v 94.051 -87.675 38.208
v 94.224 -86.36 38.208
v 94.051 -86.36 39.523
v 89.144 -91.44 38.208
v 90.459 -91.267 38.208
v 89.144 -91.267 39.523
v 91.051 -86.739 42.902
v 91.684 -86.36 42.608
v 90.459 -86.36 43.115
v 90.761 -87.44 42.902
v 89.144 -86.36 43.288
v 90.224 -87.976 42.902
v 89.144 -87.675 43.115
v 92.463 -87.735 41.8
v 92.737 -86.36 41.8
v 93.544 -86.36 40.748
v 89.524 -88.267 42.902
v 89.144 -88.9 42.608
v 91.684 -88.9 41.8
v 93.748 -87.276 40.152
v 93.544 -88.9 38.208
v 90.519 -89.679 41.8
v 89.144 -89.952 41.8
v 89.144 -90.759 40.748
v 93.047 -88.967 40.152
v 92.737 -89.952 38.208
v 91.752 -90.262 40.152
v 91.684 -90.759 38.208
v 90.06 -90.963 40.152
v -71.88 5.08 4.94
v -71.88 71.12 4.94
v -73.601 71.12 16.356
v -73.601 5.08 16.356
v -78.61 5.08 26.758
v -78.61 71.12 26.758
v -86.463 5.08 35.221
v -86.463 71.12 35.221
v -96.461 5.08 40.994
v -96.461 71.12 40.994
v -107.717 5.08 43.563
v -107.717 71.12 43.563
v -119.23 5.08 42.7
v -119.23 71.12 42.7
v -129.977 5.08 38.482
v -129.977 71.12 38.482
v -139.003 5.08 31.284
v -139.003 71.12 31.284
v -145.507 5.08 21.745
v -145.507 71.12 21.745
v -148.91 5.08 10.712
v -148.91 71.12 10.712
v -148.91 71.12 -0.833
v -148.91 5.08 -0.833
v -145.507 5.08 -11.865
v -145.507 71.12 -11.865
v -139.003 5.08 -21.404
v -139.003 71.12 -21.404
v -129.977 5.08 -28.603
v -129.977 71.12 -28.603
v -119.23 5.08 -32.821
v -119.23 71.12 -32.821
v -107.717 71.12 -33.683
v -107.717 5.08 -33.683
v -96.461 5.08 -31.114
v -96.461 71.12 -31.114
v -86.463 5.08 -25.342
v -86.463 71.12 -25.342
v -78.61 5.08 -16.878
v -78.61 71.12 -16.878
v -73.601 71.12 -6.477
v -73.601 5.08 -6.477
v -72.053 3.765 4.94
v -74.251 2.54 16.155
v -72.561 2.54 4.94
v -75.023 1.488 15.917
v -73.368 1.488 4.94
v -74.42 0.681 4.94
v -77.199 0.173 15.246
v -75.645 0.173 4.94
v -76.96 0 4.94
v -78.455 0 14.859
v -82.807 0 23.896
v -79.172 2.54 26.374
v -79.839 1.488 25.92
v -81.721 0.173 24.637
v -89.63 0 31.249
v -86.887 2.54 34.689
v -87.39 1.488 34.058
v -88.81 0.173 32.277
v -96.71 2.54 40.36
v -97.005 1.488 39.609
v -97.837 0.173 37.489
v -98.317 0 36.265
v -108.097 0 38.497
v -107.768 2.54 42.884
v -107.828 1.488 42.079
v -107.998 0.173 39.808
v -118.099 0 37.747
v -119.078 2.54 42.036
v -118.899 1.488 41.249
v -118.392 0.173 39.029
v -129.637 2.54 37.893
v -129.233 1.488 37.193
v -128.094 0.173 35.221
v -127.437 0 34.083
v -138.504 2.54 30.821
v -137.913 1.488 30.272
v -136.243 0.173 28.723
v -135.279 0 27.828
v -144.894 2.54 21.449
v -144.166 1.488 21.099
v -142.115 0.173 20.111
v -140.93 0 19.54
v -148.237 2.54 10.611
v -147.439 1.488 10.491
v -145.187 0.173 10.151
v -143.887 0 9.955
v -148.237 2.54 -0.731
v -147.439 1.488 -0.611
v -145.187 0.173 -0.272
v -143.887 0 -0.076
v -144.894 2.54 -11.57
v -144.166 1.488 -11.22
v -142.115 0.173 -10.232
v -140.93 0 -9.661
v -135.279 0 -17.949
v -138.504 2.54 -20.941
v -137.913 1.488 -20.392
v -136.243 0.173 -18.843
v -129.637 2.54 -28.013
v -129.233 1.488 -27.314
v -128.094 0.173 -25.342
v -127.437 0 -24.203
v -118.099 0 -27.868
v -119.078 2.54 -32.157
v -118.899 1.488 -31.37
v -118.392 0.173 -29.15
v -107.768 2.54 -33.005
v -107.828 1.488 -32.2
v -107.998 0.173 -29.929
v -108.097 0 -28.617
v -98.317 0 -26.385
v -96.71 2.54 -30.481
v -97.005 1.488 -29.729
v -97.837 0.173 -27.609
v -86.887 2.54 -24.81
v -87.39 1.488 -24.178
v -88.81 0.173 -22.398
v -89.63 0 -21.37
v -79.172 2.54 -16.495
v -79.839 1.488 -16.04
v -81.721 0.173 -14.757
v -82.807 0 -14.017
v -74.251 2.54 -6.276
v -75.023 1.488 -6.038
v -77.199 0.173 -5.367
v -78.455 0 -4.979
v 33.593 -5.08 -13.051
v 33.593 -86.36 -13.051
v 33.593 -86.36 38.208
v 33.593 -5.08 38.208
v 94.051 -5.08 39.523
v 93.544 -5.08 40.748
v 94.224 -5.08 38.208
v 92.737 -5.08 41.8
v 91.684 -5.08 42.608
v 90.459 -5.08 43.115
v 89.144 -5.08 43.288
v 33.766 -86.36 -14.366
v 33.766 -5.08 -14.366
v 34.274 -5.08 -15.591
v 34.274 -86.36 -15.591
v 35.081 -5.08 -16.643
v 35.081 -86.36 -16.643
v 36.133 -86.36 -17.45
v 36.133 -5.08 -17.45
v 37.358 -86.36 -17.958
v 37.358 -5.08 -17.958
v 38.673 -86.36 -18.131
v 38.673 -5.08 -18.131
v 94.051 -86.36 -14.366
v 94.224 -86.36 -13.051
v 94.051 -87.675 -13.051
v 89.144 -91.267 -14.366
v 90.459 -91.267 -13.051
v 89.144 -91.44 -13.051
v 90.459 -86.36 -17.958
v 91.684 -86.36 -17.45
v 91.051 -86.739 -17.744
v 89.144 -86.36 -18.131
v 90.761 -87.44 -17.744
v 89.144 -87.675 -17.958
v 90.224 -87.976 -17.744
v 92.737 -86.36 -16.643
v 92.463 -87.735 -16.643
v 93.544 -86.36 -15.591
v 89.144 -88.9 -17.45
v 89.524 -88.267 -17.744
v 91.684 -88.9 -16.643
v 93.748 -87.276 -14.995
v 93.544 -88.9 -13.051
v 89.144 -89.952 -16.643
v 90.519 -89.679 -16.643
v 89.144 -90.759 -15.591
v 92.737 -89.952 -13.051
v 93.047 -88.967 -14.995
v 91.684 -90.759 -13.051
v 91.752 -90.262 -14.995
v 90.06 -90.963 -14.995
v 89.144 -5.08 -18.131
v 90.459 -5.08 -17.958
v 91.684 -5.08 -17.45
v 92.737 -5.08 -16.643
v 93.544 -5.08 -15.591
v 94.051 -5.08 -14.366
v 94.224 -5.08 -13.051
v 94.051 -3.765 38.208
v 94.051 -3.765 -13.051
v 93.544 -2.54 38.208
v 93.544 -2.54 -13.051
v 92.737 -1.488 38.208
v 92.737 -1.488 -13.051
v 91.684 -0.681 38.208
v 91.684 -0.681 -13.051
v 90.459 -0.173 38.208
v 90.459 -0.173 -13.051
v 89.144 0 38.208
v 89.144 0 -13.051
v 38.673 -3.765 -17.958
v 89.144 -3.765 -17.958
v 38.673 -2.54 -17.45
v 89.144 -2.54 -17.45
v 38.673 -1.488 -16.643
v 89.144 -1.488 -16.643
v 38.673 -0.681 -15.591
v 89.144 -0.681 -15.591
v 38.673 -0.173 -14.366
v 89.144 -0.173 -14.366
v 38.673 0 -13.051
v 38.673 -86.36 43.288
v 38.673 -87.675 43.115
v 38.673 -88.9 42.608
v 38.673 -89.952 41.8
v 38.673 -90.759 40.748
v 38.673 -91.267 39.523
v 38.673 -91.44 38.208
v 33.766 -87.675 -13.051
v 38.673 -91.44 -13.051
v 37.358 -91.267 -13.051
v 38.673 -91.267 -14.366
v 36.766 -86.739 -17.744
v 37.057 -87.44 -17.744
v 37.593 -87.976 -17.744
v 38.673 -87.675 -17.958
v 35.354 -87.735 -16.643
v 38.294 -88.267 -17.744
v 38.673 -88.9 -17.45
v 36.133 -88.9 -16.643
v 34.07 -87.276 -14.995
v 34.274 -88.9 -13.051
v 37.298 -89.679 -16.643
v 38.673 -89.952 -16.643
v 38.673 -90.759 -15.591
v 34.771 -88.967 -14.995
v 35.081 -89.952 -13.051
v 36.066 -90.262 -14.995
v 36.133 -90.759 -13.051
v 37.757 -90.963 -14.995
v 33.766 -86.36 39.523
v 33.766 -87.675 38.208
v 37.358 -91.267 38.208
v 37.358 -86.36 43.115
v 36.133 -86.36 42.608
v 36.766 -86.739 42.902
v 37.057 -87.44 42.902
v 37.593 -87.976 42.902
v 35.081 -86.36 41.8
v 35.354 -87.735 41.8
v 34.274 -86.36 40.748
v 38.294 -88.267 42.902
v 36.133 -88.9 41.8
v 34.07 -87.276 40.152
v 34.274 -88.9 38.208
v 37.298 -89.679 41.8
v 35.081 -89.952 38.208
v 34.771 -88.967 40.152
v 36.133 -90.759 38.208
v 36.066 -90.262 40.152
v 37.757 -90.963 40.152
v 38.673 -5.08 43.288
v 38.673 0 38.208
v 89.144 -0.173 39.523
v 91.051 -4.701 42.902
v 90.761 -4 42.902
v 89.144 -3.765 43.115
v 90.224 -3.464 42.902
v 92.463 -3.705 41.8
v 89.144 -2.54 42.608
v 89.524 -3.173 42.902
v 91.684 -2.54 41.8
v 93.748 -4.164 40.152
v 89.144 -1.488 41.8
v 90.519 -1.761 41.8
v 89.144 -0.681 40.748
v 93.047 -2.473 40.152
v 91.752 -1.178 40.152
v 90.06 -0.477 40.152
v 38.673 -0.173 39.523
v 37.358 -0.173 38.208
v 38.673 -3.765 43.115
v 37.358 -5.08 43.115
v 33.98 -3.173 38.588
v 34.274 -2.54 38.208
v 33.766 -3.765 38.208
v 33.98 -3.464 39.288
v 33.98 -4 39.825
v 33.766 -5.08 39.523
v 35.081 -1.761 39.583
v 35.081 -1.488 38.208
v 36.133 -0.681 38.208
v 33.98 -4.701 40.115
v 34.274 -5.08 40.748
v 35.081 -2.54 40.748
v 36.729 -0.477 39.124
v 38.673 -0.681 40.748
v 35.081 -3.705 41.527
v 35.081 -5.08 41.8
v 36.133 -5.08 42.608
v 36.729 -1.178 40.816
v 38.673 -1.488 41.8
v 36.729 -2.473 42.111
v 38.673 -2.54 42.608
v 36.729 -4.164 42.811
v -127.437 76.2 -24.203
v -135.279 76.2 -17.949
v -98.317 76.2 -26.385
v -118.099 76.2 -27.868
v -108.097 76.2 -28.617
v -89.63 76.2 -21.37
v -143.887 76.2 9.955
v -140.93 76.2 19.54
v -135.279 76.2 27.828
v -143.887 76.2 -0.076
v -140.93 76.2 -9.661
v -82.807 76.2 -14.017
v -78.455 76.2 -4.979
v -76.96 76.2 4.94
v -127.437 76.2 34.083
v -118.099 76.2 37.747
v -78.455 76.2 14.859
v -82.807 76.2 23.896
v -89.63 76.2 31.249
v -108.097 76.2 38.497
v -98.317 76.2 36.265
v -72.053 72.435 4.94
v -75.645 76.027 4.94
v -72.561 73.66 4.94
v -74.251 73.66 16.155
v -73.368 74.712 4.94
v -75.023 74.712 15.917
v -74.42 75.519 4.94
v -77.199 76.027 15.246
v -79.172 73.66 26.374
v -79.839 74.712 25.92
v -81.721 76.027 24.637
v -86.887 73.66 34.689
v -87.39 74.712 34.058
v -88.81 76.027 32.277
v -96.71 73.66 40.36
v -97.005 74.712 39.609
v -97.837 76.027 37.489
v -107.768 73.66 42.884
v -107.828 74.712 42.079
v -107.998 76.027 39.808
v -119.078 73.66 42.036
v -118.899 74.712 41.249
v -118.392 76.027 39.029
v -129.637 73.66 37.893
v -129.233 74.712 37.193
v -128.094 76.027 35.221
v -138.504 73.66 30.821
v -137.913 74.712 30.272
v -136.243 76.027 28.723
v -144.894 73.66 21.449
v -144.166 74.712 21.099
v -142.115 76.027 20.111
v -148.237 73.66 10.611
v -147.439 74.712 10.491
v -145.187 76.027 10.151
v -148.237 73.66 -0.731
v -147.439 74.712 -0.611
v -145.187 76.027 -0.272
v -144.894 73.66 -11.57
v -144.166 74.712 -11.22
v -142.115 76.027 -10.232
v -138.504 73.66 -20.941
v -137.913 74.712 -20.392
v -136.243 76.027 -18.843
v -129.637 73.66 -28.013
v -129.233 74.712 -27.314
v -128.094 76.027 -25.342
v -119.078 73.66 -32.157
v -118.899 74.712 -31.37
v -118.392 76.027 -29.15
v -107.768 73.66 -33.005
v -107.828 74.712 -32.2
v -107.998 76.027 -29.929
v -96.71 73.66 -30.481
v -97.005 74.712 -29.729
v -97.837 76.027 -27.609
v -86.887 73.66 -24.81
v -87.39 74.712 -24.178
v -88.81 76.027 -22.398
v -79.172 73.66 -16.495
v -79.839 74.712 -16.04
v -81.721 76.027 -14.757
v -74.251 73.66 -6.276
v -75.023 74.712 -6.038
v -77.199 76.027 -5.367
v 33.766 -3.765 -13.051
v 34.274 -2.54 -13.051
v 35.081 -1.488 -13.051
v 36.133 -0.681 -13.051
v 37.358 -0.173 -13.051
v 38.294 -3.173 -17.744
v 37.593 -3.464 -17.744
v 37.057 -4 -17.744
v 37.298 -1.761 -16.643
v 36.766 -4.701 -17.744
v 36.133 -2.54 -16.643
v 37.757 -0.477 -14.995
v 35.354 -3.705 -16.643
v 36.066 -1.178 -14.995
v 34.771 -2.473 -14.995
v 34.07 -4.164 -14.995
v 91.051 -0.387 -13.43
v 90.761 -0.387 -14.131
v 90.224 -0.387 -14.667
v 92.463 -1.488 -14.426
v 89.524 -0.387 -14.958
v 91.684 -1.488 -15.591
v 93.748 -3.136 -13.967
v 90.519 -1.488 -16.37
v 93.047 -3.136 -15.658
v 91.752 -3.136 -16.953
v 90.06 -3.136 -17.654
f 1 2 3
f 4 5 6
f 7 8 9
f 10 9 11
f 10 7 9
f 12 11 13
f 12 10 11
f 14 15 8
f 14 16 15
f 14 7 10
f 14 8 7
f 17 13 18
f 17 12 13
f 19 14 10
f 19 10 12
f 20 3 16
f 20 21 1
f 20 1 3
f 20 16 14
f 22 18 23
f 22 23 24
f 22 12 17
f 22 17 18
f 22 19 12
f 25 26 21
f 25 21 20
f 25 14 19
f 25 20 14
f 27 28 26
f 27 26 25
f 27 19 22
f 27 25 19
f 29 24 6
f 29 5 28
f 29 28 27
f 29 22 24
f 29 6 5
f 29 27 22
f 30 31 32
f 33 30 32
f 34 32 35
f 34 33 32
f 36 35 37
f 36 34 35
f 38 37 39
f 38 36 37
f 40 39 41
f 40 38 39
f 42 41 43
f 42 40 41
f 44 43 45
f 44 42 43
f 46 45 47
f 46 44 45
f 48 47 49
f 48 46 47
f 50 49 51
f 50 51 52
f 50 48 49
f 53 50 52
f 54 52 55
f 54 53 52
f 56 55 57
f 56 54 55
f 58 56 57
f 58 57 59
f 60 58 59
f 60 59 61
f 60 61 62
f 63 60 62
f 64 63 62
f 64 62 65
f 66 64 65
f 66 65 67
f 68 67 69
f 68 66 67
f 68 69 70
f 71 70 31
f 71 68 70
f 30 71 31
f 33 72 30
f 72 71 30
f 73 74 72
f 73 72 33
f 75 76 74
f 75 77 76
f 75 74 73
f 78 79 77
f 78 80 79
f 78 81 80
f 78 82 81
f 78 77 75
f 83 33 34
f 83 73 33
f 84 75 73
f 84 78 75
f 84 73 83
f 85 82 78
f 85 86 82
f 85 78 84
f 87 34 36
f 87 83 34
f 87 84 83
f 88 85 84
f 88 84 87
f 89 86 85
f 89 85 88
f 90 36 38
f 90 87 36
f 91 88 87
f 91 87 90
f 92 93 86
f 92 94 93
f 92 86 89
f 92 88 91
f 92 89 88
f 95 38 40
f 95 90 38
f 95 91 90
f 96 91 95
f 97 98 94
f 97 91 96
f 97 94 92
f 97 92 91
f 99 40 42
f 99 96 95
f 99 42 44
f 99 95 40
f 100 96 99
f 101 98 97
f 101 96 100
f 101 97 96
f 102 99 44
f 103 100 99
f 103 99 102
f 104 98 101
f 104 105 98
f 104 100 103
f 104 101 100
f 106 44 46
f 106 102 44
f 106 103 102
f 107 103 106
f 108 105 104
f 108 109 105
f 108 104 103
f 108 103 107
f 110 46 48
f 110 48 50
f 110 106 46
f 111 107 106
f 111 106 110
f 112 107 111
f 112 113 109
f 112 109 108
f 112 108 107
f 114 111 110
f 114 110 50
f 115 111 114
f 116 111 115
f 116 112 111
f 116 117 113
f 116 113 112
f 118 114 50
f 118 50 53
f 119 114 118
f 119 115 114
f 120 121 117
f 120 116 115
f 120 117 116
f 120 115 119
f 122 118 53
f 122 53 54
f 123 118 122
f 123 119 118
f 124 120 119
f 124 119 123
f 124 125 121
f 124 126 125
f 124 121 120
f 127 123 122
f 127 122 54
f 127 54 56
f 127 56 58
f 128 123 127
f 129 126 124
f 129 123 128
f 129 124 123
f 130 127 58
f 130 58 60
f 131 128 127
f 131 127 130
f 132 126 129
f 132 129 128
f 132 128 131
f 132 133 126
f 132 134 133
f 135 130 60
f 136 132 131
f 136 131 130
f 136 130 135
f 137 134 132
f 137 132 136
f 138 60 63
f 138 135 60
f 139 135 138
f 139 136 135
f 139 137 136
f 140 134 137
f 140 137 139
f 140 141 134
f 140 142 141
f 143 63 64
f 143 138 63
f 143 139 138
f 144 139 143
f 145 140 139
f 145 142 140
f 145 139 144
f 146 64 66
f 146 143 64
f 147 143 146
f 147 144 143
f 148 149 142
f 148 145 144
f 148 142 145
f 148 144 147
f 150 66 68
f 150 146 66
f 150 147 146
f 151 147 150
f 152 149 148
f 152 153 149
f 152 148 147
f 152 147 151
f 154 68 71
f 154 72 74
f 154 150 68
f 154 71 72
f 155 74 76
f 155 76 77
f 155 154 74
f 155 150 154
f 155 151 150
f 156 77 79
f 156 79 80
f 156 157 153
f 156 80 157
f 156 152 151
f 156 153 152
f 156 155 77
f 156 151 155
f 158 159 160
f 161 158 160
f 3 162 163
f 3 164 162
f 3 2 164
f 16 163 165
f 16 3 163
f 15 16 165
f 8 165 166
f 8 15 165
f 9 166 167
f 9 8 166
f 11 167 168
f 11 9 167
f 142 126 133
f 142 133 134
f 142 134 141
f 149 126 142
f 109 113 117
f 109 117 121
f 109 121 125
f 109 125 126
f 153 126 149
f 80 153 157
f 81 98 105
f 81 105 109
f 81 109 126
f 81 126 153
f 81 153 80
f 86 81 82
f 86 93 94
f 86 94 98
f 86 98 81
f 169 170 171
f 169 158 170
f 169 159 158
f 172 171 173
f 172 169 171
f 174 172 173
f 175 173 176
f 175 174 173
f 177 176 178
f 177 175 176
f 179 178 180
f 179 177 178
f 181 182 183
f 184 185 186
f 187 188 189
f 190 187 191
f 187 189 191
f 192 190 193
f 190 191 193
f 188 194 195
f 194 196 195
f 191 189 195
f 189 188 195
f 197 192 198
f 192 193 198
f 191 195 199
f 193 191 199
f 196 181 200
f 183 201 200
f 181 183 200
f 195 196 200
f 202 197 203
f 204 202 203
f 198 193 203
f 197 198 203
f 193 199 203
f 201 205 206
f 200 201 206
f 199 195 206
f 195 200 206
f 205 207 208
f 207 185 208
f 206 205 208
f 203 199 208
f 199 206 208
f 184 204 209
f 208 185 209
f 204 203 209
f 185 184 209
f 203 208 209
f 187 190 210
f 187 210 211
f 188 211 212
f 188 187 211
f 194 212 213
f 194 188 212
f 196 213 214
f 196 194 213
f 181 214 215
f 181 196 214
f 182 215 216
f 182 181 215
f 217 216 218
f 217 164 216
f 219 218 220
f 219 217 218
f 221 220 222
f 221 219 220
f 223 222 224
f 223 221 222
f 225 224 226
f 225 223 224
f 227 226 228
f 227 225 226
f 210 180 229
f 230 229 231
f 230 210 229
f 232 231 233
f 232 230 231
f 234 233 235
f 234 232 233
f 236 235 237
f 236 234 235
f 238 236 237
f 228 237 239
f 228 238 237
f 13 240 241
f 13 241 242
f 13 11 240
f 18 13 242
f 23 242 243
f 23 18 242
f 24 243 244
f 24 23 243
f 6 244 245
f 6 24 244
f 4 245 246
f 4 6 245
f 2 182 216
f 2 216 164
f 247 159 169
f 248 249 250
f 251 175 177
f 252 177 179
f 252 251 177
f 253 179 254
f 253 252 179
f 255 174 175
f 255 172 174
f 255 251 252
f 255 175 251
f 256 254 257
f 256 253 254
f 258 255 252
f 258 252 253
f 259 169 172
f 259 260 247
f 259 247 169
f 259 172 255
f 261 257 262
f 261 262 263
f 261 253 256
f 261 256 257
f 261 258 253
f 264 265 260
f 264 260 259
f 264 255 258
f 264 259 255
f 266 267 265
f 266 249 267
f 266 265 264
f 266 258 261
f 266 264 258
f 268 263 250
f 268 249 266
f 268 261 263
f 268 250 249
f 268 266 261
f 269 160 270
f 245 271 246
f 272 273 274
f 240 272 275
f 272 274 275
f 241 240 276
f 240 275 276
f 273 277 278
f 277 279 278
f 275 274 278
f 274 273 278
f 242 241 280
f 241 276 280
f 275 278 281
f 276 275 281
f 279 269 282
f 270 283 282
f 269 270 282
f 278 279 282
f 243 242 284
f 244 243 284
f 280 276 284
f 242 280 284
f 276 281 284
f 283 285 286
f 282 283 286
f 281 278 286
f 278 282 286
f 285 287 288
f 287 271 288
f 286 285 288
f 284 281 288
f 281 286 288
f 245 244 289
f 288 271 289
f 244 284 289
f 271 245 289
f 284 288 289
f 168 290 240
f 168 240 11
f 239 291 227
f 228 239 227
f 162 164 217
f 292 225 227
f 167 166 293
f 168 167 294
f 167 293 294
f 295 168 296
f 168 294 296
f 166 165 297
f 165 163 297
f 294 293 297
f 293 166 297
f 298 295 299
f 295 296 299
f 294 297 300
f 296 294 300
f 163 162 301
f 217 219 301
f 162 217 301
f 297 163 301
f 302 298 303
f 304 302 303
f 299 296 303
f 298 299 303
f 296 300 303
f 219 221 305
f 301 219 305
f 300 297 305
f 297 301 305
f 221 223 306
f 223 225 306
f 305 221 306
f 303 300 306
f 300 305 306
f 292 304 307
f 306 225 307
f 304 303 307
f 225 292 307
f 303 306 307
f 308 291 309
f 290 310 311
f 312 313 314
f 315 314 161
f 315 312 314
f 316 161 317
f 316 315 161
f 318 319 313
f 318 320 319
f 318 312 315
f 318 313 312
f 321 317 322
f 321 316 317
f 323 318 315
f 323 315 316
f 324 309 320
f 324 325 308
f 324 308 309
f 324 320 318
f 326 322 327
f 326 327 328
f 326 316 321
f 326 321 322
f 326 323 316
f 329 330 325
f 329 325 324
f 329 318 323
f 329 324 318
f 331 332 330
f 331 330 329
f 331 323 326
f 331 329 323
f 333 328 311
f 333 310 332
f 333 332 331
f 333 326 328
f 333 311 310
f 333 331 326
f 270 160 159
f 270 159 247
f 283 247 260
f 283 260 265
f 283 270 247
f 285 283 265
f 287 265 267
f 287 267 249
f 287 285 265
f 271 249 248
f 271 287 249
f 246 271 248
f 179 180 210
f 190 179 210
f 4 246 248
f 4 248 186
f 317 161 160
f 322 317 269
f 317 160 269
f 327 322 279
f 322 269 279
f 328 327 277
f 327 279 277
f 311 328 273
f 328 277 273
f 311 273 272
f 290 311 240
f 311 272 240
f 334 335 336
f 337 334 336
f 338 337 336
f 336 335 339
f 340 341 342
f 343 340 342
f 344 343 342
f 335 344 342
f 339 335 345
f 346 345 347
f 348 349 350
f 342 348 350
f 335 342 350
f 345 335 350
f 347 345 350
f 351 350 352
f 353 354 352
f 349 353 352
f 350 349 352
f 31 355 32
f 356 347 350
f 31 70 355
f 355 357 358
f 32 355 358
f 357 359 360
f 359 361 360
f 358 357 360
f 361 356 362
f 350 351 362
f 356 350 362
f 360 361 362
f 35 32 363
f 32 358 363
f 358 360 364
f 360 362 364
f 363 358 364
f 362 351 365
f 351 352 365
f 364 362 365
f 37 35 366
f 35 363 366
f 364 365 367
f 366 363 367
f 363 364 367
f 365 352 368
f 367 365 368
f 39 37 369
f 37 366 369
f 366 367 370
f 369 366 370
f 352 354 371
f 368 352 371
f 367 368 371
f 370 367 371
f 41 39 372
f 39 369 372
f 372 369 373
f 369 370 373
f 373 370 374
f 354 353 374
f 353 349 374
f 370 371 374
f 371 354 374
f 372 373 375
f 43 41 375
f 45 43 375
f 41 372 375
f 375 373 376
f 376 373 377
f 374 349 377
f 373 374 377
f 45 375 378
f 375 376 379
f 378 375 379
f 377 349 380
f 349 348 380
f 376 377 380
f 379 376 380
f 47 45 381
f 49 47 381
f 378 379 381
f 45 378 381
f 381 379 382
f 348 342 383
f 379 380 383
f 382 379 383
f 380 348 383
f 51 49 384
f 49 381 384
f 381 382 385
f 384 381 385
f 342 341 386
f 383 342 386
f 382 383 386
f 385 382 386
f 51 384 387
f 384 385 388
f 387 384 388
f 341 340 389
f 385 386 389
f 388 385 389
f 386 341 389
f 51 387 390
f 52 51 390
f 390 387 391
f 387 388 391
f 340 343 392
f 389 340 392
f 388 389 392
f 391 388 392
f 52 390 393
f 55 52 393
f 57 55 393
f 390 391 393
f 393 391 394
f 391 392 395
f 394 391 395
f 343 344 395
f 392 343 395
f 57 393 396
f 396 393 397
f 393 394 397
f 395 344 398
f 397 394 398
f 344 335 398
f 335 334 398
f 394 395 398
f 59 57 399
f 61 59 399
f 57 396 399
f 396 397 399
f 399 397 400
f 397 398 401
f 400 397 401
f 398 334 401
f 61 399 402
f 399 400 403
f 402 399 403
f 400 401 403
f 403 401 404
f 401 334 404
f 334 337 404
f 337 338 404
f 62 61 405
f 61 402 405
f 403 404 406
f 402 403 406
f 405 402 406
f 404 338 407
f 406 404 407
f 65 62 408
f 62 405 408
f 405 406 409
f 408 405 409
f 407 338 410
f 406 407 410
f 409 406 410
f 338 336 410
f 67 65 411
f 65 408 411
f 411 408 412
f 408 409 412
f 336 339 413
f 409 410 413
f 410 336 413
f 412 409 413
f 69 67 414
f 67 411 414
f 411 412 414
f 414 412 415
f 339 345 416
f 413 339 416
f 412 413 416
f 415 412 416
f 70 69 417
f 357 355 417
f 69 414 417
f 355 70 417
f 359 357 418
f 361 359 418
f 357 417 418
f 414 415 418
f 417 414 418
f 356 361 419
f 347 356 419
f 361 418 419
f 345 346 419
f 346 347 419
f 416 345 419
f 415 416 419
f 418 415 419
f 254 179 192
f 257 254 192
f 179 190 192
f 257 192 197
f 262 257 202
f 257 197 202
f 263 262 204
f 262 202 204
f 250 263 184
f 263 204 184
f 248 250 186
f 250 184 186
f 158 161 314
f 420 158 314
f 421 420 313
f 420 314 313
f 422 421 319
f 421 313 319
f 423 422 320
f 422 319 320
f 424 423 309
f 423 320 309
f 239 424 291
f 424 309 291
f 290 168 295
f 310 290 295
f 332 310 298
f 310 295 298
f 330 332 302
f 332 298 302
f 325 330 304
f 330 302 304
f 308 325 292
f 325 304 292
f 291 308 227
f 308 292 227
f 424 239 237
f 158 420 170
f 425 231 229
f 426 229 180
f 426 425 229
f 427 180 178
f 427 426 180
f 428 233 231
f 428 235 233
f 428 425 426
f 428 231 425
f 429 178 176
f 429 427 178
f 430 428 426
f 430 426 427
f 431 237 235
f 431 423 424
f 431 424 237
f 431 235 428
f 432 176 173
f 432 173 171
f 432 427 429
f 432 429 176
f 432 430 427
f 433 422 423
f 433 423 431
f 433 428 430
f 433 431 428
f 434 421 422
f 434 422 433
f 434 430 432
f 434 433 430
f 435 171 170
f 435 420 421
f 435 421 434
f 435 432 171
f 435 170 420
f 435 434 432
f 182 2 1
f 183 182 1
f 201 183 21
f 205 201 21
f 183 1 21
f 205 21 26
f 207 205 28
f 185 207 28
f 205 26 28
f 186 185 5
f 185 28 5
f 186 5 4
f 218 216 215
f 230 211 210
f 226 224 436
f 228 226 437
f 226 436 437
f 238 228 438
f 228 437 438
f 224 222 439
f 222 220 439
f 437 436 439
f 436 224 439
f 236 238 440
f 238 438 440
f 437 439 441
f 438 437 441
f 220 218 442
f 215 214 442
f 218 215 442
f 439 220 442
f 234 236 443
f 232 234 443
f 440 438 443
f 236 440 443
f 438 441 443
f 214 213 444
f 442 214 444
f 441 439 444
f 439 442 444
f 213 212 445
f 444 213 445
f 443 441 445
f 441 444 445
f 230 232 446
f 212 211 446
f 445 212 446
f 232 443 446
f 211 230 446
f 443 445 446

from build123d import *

# Parameters (mm, degrees)
F0_R     = 38.731281
F1_DEPTH = 76.2
F2_R     = 5.08
F3_W     = 60.631369
F3_H     = 61.419338
F4_DEPTH = 91.44
F5_R     = 5.08


with BuildPart() as f1:
    # F0 (on Front) → F1 (new body)
    with BuildSketch(Plane.XZ):
        with Locations((-110.611297, 4.939702)):
            Circle(F0_R)
    extrude(amount=-F1_DEPTH)

    # F2
    f2_edges = [f1.edges().sort_by_distance(p)[0] for p in [
        (-149.342579, 76.2, 4.939702),
        (-149.342579, 0, 4.939702),
    ]]
    fillet(f2_edges, radius=F2_R)


with BuildPart() as f4:
    # F3 (on Front) → F4 (new body)
    with BuildSketch(Plane.XZ):
        with Locations((63.908746, 12.578685)):
            Rectangle(F3_W, F3_H)
    extrude(amount=F4_DEPTH)

    # F5
    f5_edges = [f4.edges().sort_by_distance(p)[0] for p in [
        (94.224431, -91.44, 12.578685),
        (94.224431, -45.72, -18.130984),
        (94.224431, 0, 12.578685),
        (94.224431, -45.72, 43.288354),
        (63.908746, 0, 43.288354),
        (33.593062, 0, 12.578685),
        (63.908746, 0, -18.130984),
        (33.593062, -91.44, 12.578685),
        (33.593062, -45.72, 43.288354),
        (33.593062, -45.72, -18.130984),
        (63.908746, -91.44, -18.130984),
        (63.908746, -91.44, 43.288354),
    ]]
    fillet(f5_edges, radius=F5_R)


solid = Compound([f1.part, f4.part])
